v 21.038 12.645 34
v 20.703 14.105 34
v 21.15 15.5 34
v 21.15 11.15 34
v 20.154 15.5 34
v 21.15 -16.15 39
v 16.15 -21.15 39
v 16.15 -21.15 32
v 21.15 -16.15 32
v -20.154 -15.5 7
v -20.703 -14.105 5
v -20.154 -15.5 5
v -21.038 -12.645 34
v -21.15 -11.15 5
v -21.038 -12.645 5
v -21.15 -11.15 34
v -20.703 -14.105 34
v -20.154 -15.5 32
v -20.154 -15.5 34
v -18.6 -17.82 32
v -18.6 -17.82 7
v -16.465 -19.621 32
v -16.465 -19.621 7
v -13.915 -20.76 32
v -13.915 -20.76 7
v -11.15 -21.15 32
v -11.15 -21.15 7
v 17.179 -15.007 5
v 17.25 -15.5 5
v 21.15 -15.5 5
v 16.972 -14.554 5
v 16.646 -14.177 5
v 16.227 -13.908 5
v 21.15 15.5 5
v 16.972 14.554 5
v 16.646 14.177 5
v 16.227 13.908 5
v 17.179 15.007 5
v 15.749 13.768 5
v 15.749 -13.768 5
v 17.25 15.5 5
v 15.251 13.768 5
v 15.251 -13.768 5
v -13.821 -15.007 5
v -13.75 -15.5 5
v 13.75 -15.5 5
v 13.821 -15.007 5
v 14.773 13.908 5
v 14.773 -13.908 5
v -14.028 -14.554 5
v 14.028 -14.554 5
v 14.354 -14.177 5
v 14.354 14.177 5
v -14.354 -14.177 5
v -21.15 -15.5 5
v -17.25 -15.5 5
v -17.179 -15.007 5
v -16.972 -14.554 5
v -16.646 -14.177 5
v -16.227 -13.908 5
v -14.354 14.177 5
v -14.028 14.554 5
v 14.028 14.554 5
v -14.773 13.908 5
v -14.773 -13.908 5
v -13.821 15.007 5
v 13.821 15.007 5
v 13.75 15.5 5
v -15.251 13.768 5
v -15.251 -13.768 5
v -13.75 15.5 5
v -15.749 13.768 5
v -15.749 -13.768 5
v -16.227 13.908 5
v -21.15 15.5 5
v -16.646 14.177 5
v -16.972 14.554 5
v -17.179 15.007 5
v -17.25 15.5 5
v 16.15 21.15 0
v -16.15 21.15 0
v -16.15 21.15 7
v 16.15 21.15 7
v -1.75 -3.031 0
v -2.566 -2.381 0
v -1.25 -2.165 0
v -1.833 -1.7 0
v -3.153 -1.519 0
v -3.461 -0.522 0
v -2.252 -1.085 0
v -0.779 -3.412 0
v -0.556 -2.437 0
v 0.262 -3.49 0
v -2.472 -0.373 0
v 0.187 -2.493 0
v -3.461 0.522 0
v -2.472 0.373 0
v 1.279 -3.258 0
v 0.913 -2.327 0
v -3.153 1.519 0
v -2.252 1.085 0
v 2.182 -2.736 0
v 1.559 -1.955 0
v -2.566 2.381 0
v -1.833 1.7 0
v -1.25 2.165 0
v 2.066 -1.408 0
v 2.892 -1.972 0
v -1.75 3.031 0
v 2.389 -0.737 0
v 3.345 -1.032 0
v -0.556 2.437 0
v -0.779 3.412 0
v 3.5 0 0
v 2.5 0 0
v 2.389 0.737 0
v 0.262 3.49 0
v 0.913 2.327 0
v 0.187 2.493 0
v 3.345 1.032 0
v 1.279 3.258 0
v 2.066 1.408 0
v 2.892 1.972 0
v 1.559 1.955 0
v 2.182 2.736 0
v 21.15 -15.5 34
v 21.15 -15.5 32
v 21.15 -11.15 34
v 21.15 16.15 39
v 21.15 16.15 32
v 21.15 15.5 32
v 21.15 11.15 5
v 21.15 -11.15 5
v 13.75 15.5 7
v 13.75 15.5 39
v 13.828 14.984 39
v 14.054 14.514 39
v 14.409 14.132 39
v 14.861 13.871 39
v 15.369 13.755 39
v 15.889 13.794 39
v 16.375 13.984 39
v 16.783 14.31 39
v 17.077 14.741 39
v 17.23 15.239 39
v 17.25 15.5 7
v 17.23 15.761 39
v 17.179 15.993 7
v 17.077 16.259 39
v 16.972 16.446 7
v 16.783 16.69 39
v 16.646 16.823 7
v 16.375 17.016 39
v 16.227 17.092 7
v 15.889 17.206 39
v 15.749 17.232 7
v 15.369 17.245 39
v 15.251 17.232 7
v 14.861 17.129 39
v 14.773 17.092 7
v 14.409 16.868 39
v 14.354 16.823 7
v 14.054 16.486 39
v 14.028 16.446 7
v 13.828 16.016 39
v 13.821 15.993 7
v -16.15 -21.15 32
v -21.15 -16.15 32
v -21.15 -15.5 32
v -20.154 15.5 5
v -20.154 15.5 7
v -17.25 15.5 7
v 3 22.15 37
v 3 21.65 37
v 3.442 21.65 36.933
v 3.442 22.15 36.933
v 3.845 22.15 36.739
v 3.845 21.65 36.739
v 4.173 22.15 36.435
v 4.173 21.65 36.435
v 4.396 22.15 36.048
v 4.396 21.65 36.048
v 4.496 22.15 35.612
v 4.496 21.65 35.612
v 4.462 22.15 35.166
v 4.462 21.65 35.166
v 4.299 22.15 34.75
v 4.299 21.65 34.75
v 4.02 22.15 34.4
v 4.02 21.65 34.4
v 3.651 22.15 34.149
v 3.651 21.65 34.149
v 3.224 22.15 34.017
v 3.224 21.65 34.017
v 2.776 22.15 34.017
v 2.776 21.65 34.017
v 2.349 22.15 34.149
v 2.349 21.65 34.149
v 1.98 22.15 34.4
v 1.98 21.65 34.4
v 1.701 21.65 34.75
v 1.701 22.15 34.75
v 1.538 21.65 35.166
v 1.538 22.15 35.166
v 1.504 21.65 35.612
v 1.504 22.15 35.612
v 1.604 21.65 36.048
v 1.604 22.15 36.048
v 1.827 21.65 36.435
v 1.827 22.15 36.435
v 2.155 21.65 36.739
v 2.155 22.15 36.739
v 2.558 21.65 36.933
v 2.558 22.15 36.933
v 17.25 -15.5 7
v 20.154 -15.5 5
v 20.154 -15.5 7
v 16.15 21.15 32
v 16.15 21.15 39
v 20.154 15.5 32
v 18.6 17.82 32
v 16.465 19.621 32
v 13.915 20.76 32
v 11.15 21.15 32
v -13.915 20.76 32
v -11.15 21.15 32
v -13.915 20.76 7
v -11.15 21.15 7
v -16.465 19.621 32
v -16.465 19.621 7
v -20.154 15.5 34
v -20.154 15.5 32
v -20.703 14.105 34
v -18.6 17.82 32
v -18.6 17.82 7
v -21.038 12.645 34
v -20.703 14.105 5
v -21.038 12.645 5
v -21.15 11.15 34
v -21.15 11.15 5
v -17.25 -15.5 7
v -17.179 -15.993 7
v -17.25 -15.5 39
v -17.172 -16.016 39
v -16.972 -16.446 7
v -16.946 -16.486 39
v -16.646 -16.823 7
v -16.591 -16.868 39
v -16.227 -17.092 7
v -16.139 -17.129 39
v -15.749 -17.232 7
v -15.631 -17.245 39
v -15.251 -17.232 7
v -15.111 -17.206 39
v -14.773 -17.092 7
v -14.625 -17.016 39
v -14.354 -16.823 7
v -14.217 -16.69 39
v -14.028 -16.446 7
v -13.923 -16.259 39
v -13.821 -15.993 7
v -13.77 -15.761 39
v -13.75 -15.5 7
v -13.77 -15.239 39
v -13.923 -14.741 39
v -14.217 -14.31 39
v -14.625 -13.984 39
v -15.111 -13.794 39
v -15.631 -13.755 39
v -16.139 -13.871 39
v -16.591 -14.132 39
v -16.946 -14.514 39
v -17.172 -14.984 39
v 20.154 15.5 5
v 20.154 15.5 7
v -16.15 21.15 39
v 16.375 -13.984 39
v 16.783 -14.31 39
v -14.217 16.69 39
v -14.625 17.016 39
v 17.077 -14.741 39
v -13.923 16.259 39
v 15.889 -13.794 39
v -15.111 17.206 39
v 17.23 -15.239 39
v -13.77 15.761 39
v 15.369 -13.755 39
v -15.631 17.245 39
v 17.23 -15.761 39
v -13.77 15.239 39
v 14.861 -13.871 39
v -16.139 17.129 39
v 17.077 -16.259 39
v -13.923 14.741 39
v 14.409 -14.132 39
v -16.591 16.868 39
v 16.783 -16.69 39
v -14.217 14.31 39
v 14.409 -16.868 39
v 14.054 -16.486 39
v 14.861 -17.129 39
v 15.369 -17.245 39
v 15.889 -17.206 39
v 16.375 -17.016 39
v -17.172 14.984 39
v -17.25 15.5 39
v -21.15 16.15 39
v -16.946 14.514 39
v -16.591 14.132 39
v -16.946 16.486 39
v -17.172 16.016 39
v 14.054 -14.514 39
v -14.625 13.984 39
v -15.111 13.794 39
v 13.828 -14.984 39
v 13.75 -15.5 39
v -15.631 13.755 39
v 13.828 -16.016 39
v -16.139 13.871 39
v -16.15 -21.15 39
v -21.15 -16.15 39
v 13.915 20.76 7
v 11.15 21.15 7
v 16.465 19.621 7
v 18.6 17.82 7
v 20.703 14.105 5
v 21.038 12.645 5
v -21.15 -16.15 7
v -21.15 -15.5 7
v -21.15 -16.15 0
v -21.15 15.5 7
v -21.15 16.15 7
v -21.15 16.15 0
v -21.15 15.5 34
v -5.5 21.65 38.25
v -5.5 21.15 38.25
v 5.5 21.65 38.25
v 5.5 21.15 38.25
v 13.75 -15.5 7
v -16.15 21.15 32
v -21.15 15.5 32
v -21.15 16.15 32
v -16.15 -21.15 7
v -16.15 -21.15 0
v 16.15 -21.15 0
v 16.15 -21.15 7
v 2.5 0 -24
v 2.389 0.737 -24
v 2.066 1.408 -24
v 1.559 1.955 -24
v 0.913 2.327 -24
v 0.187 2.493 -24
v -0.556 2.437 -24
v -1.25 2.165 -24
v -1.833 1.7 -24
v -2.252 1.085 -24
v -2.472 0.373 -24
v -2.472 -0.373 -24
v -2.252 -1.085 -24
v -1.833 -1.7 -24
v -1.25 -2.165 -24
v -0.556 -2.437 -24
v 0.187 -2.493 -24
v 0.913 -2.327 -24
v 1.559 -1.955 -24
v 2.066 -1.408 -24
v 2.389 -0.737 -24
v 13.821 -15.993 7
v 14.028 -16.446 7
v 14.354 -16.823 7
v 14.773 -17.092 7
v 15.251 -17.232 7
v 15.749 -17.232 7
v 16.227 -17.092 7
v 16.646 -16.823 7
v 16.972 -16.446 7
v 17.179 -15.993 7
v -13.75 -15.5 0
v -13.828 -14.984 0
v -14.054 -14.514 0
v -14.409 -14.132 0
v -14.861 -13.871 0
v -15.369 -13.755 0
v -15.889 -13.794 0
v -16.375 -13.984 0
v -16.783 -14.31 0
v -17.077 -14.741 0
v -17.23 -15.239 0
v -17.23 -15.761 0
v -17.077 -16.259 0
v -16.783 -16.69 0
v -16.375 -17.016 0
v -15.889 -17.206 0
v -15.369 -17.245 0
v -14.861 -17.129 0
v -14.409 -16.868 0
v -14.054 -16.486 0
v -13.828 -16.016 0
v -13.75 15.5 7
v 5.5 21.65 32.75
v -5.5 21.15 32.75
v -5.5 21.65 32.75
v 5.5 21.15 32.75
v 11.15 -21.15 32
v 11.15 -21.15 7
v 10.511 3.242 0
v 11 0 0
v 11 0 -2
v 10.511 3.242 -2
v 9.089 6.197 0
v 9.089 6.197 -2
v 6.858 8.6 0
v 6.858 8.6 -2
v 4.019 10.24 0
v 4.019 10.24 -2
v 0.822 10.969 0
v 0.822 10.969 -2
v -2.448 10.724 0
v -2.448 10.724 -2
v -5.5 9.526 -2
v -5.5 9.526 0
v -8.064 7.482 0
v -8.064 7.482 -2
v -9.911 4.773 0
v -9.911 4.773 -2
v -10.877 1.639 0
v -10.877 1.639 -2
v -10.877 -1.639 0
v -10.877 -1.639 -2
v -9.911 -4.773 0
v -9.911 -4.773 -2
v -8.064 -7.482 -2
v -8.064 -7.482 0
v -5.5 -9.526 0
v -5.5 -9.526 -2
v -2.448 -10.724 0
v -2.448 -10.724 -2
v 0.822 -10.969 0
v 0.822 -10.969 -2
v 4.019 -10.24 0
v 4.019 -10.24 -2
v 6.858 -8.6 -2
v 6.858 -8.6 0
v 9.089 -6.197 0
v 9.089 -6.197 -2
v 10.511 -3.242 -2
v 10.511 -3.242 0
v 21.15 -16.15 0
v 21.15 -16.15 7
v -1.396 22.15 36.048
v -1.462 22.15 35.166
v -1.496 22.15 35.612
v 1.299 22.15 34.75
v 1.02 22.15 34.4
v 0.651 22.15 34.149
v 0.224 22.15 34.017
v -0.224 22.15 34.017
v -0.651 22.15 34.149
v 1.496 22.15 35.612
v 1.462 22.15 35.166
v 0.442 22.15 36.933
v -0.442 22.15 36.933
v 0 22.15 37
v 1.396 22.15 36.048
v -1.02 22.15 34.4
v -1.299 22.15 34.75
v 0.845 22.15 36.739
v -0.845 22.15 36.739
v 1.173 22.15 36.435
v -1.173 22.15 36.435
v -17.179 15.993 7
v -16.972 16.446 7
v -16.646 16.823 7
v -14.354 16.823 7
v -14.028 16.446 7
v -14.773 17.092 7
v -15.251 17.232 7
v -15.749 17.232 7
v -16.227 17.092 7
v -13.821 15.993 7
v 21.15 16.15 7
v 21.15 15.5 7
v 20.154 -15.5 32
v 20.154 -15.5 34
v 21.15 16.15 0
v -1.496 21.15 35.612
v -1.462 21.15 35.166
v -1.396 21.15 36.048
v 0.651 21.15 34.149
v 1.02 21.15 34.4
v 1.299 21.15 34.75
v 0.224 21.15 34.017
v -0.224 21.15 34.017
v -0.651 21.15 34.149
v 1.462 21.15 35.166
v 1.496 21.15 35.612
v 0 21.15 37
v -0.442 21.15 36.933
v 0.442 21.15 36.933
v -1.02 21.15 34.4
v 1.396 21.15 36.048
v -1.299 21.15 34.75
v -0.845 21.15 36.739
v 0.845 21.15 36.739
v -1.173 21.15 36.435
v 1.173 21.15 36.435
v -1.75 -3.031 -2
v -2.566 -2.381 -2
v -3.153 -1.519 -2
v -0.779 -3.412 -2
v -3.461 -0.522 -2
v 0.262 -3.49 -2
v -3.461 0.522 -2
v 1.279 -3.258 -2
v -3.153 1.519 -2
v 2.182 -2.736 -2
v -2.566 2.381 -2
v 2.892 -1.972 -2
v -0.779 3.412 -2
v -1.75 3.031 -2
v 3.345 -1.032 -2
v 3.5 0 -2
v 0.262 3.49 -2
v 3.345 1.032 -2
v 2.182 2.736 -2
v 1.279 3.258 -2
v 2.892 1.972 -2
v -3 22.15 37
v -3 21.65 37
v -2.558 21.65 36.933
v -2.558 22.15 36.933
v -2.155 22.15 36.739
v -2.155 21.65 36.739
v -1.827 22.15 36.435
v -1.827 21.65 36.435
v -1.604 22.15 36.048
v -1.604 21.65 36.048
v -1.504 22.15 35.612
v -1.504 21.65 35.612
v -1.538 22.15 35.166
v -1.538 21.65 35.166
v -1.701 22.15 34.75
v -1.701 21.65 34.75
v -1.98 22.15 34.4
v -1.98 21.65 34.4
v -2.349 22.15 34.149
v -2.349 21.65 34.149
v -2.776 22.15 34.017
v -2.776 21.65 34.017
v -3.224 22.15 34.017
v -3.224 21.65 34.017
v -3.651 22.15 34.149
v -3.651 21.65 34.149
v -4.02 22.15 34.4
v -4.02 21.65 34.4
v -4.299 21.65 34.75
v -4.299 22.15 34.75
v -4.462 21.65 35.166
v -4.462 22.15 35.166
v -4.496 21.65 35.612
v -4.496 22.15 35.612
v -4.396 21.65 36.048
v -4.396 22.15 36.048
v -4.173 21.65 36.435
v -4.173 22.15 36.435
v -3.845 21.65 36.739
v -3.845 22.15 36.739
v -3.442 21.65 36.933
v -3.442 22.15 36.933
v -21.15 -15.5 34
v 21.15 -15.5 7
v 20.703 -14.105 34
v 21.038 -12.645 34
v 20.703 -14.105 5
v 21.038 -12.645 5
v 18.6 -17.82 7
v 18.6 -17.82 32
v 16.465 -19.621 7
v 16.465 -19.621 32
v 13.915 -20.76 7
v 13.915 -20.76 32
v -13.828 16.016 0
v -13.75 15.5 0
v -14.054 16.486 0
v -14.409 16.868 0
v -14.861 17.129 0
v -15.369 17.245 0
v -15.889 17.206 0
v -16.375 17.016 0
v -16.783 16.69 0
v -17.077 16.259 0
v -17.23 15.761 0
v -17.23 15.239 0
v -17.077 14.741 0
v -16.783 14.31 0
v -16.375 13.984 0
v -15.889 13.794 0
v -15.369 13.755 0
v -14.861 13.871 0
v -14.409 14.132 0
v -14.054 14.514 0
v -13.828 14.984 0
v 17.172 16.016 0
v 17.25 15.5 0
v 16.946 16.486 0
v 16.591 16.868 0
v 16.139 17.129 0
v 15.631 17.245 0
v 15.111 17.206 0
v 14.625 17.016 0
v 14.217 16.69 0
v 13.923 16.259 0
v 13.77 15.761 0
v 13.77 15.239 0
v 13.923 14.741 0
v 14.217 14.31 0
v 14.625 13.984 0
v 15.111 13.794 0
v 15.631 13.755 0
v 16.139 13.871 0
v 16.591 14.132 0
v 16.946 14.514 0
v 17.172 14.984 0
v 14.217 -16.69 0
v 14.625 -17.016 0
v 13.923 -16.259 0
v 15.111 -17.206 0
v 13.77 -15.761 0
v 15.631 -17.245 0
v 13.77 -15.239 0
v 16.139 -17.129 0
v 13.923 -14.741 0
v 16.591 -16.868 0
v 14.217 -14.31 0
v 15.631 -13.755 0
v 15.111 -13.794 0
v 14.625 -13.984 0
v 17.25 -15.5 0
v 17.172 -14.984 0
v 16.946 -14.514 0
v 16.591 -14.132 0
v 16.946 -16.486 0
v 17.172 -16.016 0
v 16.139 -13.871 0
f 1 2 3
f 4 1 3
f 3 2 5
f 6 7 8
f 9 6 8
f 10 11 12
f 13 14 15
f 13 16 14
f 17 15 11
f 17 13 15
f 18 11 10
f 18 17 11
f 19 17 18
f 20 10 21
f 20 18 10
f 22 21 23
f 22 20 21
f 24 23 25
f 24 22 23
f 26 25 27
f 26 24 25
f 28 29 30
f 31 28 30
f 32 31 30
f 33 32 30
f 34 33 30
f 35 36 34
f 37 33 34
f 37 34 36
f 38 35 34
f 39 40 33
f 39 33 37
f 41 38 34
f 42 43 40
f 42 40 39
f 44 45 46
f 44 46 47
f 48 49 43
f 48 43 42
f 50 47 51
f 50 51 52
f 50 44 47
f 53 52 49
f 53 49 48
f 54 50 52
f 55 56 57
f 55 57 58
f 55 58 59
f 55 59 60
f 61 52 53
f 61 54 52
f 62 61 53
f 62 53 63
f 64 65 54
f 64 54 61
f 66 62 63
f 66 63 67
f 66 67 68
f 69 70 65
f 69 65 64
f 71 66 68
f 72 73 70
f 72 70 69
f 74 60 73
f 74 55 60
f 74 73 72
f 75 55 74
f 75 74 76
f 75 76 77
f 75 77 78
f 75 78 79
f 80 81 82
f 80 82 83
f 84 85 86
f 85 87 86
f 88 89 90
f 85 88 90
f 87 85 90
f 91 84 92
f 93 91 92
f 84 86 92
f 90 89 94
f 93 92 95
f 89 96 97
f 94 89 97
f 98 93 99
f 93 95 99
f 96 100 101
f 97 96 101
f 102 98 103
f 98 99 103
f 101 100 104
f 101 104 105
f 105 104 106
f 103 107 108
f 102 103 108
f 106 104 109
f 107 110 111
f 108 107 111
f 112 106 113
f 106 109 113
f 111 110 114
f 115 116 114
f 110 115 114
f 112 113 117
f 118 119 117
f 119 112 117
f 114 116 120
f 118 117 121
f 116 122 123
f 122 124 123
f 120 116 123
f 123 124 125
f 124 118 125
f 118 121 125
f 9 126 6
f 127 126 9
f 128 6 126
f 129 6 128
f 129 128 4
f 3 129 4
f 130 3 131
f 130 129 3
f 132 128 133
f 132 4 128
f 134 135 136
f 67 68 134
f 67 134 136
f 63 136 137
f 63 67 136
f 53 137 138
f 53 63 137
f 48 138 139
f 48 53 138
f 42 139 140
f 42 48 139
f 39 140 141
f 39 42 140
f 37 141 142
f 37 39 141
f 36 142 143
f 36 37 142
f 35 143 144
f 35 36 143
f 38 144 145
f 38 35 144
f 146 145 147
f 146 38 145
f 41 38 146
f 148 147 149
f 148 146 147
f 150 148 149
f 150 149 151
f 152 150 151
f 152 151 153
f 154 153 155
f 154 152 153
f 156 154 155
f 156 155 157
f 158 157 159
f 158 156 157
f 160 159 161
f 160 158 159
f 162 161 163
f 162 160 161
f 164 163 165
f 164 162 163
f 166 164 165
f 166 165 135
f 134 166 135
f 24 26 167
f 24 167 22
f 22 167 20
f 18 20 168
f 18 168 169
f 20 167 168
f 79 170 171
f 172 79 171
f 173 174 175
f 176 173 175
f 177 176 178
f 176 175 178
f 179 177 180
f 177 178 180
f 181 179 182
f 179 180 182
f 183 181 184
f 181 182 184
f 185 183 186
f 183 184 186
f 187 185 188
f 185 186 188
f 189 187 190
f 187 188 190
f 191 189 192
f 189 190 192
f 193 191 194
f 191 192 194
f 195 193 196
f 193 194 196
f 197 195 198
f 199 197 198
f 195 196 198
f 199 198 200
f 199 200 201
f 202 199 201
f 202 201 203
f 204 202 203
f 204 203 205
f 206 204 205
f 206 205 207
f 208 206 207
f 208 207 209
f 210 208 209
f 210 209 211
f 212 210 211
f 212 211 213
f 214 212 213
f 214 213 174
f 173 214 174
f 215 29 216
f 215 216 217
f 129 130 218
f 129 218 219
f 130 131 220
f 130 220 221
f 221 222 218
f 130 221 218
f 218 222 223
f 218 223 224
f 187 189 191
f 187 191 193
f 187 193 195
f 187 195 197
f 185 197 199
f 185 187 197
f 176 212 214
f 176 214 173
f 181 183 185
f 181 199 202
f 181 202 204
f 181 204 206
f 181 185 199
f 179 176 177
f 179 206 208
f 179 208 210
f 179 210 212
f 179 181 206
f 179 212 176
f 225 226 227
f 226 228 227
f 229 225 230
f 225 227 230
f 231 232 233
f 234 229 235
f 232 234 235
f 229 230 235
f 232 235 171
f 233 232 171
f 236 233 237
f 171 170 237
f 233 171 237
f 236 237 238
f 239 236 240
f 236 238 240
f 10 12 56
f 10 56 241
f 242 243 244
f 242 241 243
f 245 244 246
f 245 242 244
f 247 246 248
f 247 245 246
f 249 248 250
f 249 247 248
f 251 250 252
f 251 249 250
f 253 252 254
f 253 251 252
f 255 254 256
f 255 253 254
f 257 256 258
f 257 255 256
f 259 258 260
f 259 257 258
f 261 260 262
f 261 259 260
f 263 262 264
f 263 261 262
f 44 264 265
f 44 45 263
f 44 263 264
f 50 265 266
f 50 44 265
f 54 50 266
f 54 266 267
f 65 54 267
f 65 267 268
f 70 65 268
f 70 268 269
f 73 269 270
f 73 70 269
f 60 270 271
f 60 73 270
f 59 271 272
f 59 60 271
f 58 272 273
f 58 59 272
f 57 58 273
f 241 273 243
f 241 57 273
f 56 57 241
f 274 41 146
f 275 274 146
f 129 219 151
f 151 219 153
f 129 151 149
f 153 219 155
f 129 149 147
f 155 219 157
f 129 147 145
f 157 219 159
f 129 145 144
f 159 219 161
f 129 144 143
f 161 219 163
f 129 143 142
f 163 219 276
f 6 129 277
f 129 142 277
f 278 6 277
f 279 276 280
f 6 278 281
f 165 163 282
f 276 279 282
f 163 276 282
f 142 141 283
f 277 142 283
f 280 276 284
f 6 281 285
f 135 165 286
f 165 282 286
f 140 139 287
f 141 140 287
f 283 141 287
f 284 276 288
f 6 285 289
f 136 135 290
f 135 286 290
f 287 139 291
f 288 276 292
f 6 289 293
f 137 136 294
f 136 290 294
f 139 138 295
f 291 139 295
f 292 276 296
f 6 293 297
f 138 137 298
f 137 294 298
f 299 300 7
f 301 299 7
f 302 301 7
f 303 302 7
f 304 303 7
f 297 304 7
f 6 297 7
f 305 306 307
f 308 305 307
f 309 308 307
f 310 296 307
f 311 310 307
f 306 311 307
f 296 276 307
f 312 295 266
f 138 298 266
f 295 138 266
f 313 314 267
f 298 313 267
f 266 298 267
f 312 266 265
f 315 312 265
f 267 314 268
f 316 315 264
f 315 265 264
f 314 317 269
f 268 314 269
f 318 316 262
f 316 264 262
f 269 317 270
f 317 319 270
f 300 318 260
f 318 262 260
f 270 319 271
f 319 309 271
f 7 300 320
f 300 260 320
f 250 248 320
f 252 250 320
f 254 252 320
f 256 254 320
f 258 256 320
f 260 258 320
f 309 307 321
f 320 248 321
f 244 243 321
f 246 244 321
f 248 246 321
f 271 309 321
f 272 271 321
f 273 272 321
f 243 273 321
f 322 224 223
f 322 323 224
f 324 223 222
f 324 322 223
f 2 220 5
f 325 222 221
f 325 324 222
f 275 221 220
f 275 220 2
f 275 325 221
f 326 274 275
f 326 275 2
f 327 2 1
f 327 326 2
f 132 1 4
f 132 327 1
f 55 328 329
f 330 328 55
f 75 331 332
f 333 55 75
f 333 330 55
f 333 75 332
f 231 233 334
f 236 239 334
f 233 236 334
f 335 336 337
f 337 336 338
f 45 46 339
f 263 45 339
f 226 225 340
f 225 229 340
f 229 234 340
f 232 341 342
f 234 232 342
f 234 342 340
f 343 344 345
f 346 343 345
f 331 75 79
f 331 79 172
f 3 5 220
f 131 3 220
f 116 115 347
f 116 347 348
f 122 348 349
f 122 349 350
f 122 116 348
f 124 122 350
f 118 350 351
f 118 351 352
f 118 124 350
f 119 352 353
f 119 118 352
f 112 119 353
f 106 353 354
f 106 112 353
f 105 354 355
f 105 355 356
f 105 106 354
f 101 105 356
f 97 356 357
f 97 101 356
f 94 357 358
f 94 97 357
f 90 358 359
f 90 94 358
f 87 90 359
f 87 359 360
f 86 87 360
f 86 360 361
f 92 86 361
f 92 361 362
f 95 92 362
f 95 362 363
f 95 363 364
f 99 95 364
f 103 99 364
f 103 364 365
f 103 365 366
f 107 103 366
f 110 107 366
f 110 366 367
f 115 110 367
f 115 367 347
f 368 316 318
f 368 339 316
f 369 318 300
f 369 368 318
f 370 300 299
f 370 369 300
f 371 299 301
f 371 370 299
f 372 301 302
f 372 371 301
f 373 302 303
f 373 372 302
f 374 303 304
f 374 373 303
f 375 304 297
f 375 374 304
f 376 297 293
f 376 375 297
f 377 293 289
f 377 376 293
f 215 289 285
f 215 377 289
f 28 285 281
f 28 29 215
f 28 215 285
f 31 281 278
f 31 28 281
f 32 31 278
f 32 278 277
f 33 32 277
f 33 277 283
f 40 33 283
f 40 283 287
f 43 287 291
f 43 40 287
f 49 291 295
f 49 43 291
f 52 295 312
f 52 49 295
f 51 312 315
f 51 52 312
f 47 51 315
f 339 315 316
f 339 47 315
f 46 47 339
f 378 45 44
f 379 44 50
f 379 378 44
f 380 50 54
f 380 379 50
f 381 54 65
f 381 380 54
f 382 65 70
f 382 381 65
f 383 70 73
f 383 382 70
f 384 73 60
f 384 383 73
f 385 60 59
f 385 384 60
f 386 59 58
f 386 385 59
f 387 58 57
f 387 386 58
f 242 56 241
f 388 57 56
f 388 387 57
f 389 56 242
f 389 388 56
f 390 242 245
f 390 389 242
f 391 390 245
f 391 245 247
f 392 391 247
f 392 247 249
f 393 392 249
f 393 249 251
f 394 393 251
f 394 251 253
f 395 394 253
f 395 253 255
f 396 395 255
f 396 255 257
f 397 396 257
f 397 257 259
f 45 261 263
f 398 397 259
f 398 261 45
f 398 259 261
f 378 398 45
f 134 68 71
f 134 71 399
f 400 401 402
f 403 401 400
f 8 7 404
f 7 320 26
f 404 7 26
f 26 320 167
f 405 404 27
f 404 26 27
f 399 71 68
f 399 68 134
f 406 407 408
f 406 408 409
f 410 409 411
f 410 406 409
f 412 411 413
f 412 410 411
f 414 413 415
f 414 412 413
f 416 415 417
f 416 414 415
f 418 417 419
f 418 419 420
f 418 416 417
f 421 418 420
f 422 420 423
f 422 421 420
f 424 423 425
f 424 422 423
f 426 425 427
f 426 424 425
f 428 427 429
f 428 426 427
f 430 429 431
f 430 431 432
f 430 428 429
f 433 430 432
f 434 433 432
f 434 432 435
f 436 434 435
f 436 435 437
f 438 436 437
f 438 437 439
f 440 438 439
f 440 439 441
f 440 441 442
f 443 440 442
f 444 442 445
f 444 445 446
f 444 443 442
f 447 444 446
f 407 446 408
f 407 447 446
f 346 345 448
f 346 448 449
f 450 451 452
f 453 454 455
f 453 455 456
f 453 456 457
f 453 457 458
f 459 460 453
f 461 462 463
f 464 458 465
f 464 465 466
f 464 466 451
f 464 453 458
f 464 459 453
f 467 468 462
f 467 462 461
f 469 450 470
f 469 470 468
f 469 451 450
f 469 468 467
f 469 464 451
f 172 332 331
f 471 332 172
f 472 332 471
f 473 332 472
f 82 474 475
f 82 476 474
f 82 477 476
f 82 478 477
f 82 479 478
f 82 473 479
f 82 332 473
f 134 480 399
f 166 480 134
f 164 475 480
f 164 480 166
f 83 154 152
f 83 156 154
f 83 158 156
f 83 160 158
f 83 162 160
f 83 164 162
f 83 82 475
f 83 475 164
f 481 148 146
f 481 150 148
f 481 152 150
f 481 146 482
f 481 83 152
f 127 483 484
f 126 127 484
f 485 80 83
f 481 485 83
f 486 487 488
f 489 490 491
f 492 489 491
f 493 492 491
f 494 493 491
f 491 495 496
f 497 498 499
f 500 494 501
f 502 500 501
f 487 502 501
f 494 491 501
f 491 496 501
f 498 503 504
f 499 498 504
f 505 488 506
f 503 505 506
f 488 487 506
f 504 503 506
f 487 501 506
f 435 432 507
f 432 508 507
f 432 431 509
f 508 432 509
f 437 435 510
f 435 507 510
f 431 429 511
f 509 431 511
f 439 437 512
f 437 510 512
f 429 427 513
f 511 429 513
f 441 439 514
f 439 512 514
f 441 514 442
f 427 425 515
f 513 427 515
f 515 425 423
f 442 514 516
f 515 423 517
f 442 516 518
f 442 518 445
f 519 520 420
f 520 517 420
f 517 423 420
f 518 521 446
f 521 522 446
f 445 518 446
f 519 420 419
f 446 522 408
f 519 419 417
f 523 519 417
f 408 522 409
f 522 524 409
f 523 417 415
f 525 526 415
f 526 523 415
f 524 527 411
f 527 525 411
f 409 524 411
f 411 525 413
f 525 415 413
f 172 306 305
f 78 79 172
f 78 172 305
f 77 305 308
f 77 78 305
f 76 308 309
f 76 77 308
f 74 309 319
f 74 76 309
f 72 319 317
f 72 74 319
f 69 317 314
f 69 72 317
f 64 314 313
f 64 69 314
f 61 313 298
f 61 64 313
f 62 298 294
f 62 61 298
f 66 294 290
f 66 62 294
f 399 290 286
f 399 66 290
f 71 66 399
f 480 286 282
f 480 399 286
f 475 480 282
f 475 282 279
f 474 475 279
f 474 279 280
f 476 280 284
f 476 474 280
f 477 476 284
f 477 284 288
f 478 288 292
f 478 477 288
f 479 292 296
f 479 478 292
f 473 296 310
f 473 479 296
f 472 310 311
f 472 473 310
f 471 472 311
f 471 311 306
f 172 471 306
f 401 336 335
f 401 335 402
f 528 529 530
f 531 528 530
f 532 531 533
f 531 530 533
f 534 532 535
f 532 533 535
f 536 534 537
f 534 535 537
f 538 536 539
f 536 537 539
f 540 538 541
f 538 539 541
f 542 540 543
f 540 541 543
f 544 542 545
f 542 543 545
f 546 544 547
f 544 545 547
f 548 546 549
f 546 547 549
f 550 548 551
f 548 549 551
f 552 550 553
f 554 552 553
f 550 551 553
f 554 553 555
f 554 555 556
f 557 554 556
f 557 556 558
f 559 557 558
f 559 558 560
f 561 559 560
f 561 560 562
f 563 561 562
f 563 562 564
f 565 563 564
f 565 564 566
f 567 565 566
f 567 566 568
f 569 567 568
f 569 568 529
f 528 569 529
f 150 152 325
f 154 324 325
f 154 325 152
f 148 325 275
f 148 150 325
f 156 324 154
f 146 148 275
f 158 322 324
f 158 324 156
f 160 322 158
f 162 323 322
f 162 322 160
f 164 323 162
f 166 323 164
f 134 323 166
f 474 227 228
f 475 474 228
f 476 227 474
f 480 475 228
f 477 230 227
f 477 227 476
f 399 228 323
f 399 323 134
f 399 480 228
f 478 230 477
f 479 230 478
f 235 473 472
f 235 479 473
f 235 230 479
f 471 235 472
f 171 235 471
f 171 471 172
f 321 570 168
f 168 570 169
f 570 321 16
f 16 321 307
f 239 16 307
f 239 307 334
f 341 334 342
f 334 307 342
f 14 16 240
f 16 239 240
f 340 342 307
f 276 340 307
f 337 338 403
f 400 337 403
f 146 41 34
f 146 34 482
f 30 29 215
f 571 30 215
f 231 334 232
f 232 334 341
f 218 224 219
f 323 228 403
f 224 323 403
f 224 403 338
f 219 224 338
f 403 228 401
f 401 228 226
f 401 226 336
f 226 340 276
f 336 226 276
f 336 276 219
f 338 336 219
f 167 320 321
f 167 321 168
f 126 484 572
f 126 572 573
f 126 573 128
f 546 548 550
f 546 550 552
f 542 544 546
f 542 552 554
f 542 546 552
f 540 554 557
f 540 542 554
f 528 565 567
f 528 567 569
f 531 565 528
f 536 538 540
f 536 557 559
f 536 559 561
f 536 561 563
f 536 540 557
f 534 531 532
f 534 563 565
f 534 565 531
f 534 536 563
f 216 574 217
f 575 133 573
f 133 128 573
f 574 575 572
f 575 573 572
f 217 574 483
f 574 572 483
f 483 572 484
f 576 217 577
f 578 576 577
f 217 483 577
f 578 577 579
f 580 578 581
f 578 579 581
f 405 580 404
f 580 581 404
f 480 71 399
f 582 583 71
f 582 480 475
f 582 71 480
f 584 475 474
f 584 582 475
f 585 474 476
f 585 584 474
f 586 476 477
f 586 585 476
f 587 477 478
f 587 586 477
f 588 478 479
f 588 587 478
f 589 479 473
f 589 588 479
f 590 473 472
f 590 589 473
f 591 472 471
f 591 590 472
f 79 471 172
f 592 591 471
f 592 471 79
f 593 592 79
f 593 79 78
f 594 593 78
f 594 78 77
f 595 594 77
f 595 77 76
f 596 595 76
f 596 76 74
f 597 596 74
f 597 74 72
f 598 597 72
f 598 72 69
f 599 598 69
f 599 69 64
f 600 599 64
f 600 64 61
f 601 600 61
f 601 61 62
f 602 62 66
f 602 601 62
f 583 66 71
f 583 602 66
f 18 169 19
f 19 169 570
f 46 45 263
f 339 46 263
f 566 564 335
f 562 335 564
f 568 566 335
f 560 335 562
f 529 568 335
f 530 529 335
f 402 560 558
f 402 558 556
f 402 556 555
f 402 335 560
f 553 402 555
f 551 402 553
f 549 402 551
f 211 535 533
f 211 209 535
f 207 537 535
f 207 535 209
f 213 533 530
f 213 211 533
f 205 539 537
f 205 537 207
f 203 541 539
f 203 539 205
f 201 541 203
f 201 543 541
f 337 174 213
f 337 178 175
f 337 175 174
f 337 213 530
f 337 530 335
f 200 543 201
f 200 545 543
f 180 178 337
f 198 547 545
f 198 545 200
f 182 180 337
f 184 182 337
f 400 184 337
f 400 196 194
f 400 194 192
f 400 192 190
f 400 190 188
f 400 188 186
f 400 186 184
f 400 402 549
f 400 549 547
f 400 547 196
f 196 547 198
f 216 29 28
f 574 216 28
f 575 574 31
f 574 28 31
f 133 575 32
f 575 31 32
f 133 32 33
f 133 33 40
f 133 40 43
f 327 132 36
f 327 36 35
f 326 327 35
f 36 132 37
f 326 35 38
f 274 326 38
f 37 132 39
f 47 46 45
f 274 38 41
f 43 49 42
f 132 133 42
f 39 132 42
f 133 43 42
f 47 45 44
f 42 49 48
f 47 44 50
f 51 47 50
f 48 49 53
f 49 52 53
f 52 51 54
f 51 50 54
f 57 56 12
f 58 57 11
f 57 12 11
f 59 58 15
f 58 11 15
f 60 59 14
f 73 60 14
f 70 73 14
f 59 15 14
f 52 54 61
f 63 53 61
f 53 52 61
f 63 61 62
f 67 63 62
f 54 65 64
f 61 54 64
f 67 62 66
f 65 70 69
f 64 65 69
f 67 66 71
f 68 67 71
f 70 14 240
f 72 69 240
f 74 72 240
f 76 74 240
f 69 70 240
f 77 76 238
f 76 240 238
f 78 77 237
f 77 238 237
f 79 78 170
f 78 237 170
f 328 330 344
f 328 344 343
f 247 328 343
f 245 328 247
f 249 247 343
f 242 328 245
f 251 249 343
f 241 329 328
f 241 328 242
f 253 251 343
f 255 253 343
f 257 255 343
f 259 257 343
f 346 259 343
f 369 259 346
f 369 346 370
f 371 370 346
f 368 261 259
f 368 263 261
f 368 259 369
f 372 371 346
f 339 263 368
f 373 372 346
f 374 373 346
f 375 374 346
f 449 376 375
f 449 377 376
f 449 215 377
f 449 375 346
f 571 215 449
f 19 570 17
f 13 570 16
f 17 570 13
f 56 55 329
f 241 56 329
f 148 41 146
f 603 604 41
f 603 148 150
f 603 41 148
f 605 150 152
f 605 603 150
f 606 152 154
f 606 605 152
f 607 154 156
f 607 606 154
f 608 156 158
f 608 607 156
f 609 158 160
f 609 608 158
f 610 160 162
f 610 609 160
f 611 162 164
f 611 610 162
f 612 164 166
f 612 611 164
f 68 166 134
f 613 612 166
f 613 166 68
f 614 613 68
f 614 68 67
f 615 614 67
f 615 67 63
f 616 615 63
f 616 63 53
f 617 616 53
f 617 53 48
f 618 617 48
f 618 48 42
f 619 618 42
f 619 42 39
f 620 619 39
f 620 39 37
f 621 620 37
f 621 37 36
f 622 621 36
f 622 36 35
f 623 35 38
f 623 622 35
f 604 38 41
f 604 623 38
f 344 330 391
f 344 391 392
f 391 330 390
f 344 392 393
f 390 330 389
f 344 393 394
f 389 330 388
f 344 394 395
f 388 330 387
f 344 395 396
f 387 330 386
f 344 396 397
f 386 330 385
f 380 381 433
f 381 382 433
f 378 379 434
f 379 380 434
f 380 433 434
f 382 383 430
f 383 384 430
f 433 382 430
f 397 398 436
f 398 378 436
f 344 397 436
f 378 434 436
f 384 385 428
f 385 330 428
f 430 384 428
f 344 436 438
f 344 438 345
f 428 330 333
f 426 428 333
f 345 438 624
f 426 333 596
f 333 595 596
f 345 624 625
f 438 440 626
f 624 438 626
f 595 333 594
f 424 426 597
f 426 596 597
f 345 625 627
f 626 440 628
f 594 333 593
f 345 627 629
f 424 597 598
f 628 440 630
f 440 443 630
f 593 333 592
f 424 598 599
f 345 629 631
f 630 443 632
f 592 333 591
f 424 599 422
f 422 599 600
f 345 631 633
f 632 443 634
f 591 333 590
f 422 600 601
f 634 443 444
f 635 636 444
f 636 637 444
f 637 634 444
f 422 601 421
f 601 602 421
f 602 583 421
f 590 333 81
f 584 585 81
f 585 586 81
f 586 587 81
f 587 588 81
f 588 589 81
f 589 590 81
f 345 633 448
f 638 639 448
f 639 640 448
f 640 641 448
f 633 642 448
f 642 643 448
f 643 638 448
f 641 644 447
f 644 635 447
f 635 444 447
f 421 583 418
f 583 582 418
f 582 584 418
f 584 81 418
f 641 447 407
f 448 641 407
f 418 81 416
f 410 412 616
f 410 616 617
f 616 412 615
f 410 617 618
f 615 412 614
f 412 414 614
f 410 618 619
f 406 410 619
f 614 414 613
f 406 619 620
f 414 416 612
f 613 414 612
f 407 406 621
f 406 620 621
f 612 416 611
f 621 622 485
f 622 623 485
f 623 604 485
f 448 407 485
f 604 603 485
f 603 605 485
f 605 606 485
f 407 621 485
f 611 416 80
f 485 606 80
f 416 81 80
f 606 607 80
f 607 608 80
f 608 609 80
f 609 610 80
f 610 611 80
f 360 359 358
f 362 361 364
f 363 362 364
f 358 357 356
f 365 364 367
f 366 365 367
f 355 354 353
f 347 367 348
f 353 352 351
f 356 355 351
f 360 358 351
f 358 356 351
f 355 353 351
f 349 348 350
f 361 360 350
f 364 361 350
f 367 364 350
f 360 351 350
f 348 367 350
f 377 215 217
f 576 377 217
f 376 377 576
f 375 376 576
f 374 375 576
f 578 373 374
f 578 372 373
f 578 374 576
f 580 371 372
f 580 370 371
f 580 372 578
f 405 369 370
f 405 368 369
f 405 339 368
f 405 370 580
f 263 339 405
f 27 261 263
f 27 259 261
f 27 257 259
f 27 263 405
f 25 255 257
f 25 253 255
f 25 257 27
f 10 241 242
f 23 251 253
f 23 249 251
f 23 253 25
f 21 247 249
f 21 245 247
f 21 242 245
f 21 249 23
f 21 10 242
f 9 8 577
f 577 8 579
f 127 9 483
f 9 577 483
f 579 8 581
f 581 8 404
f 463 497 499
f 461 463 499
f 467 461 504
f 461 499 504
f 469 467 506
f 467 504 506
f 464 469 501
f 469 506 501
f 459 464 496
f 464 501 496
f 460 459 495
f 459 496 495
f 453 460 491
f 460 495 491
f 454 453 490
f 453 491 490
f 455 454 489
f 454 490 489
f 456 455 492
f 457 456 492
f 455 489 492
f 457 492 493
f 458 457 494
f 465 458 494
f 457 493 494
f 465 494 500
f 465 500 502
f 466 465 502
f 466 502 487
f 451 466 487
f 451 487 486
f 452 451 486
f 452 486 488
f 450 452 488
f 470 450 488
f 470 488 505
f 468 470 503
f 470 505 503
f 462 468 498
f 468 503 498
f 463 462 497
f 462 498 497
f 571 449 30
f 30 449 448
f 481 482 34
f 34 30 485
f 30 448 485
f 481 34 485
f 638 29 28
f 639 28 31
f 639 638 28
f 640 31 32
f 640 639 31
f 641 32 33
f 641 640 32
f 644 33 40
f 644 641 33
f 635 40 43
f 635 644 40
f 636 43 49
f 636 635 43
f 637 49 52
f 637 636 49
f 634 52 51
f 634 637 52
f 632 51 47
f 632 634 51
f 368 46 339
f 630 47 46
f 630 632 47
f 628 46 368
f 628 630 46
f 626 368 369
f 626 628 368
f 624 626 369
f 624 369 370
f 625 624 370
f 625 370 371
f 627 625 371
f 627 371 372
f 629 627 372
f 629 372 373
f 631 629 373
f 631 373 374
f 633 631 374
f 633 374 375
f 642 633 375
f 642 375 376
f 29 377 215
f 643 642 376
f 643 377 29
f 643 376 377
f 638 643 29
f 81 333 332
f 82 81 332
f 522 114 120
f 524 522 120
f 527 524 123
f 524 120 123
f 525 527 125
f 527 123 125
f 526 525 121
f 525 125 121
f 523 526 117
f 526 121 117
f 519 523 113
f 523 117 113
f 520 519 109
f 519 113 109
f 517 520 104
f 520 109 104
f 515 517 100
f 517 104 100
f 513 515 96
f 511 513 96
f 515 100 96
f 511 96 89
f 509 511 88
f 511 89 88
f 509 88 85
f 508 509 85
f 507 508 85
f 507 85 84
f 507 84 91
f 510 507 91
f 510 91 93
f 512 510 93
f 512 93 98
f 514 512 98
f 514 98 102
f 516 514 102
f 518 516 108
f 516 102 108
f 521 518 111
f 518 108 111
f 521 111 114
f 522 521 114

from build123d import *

# Parameters (mm, degrees)
ESQUISSE1_W             = 42.3
ESQUISSE1_H             = 42.3
ESQUISSE1_R             = 11
ESQUISSE1_R_2           = 1.75
ESQUISSE1_R_3           = 3.5
ESQUISSE1_R_4           = 2.5
BOSS_EXTRU_1_DEPTH      = 7
ESQUISSE1_3_R           = 11
ESQUISSE1_3_R_2         = 3.5
ESQUISSE1_3_R_3         = 2.5
BOSS_EXTRU_2_DEPTH      = 2
ESQUISSE1_5_R           = 2.5
BOSS_EXTRU_3_DEPTH      = 24
ENL_V_MAT_EXTRU_1_REACH = 55.034
ESQUISSE2_W             = 2
ESQUISSE2_H             = 31
ESQUISSE3_W             = 2
ESQUISSE3_H             = 31
BOSS_EXTRU_4_DEPTH      = 42.3
BOSS_EXTRU_5_DEPTH      = 42.3
ESQUISSE1_6_R           = 1.75
ENL_V_MAT_EXTRU_2_DEPTH = 39
CHANFREIN1_SIZE         = 5
CHANFREIN2_SIZE         = 5
CONG_1_R                = 10
ESQUISSE5_W             = 11
ESQUISSE5_H             = 5.5
BOSS_EXTRU_6_DEPTH      = 0.5
ESQUISSE5_3_R           = 1.5
BOSS_EXTRU_7_DEPTH      = 1
ESQUISSE5_5_R           = 1.5
BOSS_EXTRU_8_DEPTH      = 1
ESQUISSE5_6_R           = 1.5
BOSS_EXTRU_9_DEPTH      = 1


with BuildPart() as part:
    # Esquisse1 → Boss.-Extru.1 (new body)
    with BuildSketch(Plane.XY):
        Rectangle(ESQUISSE1_W, ESQUISSE1_H)
        Circle(ESQUISSE1_R, mode=Mode.SUBTRACT)
        with Locations((-15.5, -15.5)):
            Circle(ESQUISSE1_R_2, mode=Mode.SUBTRACT)
        with Locations((15.5, -15.5)):
            Circle(ESQUISSE1_R_2, mode=Mode.SUBTRACT)
        with Locations((15.5, 15.5)):
            Circle(ESQUISSE1_R_2, mode=Mode.SUBTRACT)
        with Locations((-15.5, 15.5)):
            Circle(ESQUISSE1_R_2, mode=Mode.SUBTRACT)
        Circle(ESQUISSE1_R)
        Circle(ESQUISSE1_R_3, mode=Mode.SUBTRACT)
        Circle(ESQUISSE1_R_3)
        Circle(ESQUISSE1_R_4, mode=Mode.SUBTRACT)
        Circle(ESQUISSE1_R_4)
    extrude(amount=BOSS_EXTRU_1_DEPTH)

    # Esquisse1_3 → Boss.-Extru.2 (add)
    with BuildSketch(Plane.XY):
        Circle(ESQUISSE1_3_R)
        Circle(ESQUISSE1_3_R_2, mode=Mode.SUBTRACT)
        Circle(ESQUISSE1_3_R_3)
    extrude(amount=-BOSS_EXTRU_2_DEPTH)

    # Esquisse1_5 → Boss.-Extru.3 (add)
    with BuildSketch(Plane.XY):
        Circle(ESQUISSE1_5_R)
    extrude(amount=-BOSS_EXTRU_3_DEPTH)

    # Esquisse2 → Enl_v. mat.-Extru.1 (cut, up to next)
    with BuildSketch(Plane.ZY.offset(21.15), mode=Mode.PRIVATE) as enl_v_mat_extru_1_sk1:
        with Locations((6, 0)):
            Rectangle(ESQUISSE2_W, ESQUISSE2_H)
    enl_v_mat_extru_1_tool1 = extrude(enl_v_mat_extru_1_sk1.sketch, amount=-ENL_V_MAT_EXTRU_1_REACH, mode=Mode.PRIVATE) & part.part
    add(enl_v_mat_extru_1_tool1.solids().sort_by_distance((-21.15, 0, 6))[0], mode=Mode.SUBTRACT)

    # Chanfrein1
    chanfrein1_edges = [part.edges().sort_by_distance(p)[0] for p in [
        (-21.15, 21.15, 3.5),
        (21.15, 21.15, 3.5),
        (21.15, -21.15, 3.5),
        (-21.15, -21.15, 3.5),
    ]]
    chamfer(chanfrein1_edges, length=CHANFREIN1_SIZE)


with BuildPart() as body_2:
    # Esquisse3 → Boss.-Extru.4 (new body)
    with BuildSketch(Plane.ZY.offset(21.15)):
        Polygon((32, 15.5), (32, 21.15), (7, 21.15), (7, 15.5), (7, -15.5), (7, -21.15), (32, -21.15), (32, -15.5), align=None)
        with Locations((33, 0)):
            Rectangle(ESQUISSE3_W, ESQUISSE3_H)
        with Locations((6, 0)):
            Rectangle(ESQUISSE3_W, ESQUISSE3_H)
    extrude(amount=-BOSS_EXTRU_4_DEPTH)


with BuildPart() as body_3:
    # Esquisse4 → Boss.-Extru.5 (new body)
    with BuildSketch(Plane.ZY.offset(21.15)):
        Polygon((32, 21.15), (39, 21.15), (39, -21.15), (32, -21.15), (32, -15.5), (34, -15.5), (34, 15.5), (32, 15.5), align=None)
    extrude(amount=-BOSS_EXTRU_5_DEPTH)


with BuildPart() as enl_v_mat_extru_2_tool:
    # Esquisse1_6 → Enl_v. mat.-Extru.2 (new body)
    with BuildSketch(Plane.XY):
        with Locations(Location((15.5, 15.5, 0), (0, 0, 180))):
            Circle(ESQUISSE1_6_R)
        with Locations(Location((-15.5, -15.5, 0), (0, 0, 180))):
            Circle(ESQUISSE1_6_R)
        with Locations(Location((15.5, -15.5, 0), (0, 0, 180))):
            Circle(ESQUISSE1_6_R)
        with Locations(Location((-15.5, 15.5, 0), (0, 0, 180))):
            Circle(ESQUISSE1_6_R)
    extrude(amount=ENL_V_MAT_EXTRU_2_DEPTH)


with BuildPart() as body_2_1:
    add(body_2.part)

    # Enl_v. mat.-Extru.2: cut by enl_v_mat_extru_2_tool
    add(enl_v_mat_extru_2_tool.part, mode=Mode.SUBTRACT)

    # Cong_1
    cong_1_edges = [body_2_1.edges().sort_by_distance(p)[0] for p in [
        (21.15, 21.15, 19.5),
        (-21.15, 21.15, 19.5),
        (21.15, -21.15, 19.5),
        (-21.15, -21.15, 19.5),
    ]]
    fillet(cong_1_edges, radius=CONG_1_R)



with BuildPart() as body_3_1:
    add(body_3.part)

    # Enl_v. mat.-Extru.2: cut by enl_v_mat_extru_2_tool
    add(enl_v_mat_extru_2_tool.part, mode=Mode.SUBTRACT)

    # Chanfrein2
    chanfrein2_edges = [body_3_1.edges().sort_by_distance(p)[0] for p in [
        (21.15, -21.15, 35.5),
        (21.15, 21.15, 35.5),
        (-21.15, 21.15, 35.5),
        (-21.15, -21.15, 35.5),
    ]]
    chamfer(chanfrein2_edges, length=CHANFREIN2_SIZE)


with BuildPart() as body_2_2:
    add(body_2_1.part)

    add(body_3_1.part)  # Boss.-Extru.6 merges body 3
    # Esquisse5 → Boss.-Extru.6 (add)
    with BuildSketch(Plane(origin=(0, 21.15, 0), x_dir=(1, 0, 0), z_dir=(0, 1, 0))):
        with Locations((0, -35.5)):
            Rectangle(ESQUISSE5_W, ESQUISSE5_H)
    extrude(amount=BOSS_EXTRU_6_DEPTH)

    # Esquisse5_3 → Boss.-Extru.7 (add)
    with BuildSketch(Plane(origin=(0, 21.15, 0), x_dir=(1, 0, 0), z_dir=(0, 1, 0))):
        with Locations(Location((-3, -35.5, 0), (0, 0, 270))):
            Circle(ESQUISSE5_3_R)
    extrude(amount=BOSS_EXTRU_7_DEPTH)

    # Esquisse5_5 → Boss.-Extru.8 (add)
    with BuildSketch(Plane(origin=(0, 21.15, 0), x_dir=(1, 0, 0), z_dir=(0, 1, 0))):
        with Locations(Location((3, -35.5, 0), (0, 0, 270))):
            Circle(ESQUISSE5_5_R)
    extrude(amount=BOSS_EXTRU_8_DEPTH)


with BuildPart() as body_3_2:
    # Esquisse5_6 → Boss.-Extru.9 (new body)
    with BuildSketch(Plane(origin=(0, 21.15, 0), x_dir=(1, 0, 0), z_dir=(0, 1, 0))):
        with Locations(Location((0, -35.5, 0), (0, 0, 270))):
            Circle(ESQUISSE5_6_R)
    extrude(amount=BOSS_EXTRU_9_DEPTH)


solid = Compound([part.part, body_2_2.part, body_3_2.part])
